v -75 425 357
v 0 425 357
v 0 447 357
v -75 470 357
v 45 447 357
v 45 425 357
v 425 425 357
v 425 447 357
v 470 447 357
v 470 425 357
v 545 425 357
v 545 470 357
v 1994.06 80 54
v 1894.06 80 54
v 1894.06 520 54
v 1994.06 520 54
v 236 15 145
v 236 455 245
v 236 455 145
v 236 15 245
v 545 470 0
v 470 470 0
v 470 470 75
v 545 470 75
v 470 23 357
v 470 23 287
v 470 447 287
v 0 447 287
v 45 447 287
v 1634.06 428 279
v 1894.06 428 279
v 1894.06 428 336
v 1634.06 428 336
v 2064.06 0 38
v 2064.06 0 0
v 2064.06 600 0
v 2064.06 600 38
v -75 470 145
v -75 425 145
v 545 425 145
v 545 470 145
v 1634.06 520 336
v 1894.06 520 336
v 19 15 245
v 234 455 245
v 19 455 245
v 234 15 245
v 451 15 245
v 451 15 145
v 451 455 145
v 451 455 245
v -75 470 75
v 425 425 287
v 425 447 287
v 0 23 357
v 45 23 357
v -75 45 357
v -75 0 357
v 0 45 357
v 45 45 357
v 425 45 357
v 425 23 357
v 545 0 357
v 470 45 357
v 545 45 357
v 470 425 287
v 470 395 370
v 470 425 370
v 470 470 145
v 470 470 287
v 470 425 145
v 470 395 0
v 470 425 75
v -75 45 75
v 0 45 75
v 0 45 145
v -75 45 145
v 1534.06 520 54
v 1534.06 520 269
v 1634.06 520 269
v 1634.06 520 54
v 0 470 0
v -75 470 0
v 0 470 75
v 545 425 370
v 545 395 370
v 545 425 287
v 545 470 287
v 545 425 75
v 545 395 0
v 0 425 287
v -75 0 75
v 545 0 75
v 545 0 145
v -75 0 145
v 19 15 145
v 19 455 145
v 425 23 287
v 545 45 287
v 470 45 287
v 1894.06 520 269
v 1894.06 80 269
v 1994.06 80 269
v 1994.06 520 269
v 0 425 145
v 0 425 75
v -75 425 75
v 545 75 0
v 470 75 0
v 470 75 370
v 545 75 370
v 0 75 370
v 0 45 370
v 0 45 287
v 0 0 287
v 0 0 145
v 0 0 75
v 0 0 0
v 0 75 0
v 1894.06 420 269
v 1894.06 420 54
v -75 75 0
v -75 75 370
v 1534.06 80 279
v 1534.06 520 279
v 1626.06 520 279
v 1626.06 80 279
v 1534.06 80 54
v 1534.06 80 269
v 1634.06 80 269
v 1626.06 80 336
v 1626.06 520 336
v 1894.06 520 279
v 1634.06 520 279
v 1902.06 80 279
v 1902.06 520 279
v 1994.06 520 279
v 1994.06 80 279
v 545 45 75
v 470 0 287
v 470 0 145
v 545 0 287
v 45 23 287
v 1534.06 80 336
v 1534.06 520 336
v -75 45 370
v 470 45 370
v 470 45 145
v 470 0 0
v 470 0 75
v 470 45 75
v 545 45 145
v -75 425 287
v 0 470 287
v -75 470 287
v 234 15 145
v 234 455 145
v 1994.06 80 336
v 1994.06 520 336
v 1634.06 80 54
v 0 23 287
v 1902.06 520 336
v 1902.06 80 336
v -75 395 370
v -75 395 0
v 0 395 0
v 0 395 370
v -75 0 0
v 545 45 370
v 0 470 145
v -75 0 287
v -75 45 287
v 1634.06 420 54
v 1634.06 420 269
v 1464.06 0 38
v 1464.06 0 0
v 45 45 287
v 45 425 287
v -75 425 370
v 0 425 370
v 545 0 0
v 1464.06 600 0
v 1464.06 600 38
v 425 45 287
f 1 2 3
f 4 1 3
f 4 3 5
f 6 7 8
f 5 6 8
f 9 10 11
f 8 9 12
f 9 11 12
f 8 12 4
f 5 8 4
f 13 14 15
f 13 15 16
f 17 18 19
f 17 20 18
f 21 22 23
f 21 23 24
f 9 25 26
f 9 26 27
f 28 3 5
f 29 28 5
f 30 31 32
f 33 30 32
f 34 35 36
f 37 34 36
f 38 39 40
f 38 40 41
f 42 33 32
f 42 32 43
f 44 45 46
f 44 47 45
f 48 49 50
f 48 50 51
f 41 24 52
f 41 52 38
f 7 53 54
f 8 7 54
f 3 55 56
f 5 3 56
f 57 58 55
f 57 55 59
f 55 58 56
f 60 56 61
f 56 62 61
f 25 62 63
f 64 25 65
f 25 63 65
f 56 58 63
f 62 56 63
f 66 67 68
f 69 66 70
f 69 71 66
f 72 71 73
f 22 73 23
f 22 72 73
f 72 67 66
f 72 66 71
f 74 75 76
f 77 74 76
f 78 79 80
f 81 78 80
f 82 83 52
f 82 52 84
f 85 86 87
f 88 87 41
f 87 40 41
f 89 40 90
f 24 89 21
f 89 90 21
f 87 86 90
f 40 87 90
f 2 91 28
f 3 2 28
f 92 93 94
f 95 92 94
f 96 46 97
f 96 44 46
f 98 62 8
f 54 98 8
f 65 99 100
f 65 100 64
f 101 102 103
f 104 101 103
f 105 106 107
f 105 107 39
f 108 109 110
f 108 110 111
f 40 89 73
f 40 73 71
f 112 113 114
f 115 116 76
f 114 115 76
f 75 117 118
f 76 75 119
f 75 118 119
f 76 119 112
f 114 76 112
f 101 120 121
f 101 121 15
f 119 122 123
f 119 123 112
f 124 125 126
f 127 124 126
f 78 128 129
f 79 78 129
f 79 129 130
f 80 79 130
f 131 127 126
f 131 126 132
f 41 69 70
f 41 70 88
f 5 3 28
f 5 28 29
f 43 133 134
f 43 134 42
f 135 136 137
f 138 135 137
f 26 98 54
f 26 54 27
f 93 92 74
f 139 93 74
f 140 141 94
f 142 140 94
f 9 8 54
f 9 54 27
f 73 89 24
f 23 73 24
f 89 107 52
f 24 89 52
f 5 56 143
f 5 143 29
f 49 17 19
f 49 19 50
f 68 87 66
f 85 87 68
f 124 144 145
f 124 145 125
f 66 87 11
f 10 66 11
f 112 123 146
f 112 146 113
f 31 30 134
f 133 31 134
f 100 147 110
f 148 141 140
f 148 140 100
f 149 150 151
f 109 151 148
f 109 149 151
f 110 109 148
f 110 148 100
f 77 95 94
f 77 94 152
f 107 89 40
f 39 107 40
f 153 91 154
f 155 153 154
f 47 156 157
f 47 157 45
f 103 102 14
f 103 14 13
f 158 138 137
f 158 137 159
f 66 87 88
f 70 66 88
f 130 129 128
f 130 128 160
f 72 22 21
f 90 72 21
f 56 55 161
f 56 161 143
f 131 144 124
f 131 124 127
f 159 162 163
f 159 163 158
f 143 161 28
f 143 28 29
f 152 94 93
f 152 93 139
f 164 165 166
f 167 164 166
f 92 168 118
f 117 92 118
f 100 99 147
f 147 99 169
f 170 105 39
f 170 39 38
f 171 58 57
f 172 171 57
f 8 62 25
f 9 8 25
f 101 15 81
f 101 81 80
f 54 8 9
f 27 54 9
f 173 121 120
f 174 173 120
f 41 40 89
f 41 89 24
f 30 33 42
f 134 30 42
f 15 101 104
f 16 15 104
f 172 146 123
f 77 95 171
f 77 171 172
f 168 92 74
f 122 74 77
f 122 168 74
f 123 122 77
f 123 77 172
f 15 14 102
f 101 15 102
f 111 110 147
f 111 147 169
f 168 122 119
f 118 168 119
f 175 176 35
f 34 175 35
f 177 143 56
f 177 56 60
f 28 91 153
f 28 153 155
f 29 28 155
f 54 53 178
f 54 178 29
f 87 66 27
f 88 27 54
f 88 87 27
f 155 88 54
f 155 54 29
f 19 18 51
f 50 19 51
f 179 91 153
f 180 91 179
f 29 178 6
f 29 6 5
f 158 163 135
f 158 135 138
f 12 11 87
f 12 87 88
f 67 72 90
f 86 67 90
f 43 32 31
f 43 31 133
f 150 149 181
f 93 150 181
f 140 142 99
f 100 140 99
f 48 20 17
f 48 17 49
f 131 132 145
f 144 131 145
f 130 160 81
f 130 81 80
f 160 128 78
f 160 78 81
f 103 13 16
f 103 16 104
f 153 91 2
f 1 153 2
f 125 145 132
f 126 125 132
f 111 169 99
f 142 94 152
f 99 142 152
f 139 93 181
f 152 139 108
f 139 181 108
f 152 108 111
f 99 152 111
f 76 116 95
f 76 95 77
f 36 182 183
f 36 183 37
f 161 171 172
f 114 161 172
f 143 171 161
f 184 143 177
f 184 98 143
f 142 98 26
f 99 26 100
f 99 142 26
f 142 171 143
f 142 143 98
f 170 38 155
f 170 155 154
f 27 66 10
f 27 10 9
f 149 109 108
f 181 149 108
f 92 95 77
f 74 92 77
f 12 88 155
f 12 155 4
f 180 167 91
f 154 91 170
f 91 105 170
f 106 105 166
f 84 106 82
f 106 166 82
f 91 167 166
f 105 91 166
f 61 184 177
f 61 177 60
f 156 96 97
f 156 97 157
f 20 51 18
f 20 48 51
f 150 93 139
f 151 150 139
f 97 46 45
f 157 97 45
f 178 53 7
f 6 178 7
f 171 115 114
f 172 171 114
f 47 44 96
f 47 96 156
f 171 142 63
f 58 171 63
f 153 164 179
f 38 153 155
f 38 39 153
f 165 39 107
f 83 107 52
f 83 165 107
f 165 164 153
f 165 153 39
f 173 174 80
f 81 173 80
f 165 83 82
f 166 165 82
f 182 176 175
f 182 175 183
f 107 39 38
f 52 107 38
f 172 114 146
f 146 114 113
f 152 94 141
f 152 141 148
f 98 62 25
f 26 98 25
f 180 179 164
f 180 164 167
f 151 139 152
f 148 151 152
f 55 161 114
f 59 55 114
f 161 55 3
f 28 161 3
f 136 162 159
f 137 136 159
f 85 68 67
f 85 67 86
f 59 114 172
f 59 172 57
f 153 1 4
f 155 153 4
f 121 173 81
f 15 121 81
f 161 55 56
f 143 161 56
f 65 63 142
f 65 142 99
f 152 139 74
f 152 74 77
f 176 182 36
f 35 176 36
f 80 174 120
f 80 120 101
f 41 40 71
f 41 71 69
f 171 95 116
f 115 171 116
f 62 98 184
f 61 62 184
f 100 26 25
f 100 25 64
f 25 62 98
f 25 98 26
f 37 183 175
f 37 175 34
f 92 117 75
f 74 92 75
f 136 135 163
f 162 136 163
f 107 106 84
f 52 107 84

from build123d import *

# Parameters (mm, degrees)
F0_W      = 75
F0_H      = 75
F1_DEPTH  = 370
F2_W      = 45
F2_H      = 204.2819981575
F2_W_2    = 53.7973015904
F2_H_2    = 70
F3_DEPTH  = 620.001
F4_W      = 45
F4_H      = 70
F5_DEPTH  = 620
F6_W      = 45
F6_H      = 22
F7_DEPTH  = 70
F8_W      = 45
F8_H      = 424
F9_DEPTH  = 70
F12_DEPTH = 220
F13_W     = 600
F13_H     = 600
F14_DEPTH = 38
F16_START = -80
F15_W     = 100
F15_H     = 215
F16_DEPTH = 440
F15_W_2   = 92
F15_H_2   = 57
F17_W     = 100
F17_H     = 215
F18_DEPTH = 260
F17_W_2   = 92
F17_H_2   = 57


with BuildPart() as f1:
    # F0 (on Top) → F1 (new body)
    with BuildSketch(Plane.XY):
        with Locations((-37.5, 37.5)):
            Rectangle(F0_W, F0_H)
    extrude(amount=F1_DEPTH)


with BuildPart() as f1b:
    # F0 (on Top) → F1, piece 2 (new body)
    with BuildSketch(Plane.XY):
        with Locations((-37.5, 432.5)):
            Rectangle(F0_W, F0_H)
    extrude(amount=F1_DEPTH)


with BuildPart() as f1c:
    # F0 (on Top) → F1, piece 3 (new body)
    with BuildSketch(Plane.XY):
        with Locations((507.5, 432.5)):
            Rectangle(F0_W, F0_H)
    extrude(amount=F1_DEPTH)


with BuildPart() as f1d:
    # F0 (on Top) → F1, piece 4 (new body)
    with BuildSketch(Plane.XY):
        with Locations((507.5, 37.5)):
            Rectangle(F0_W, F0_H)
    extrude(amount=F1_DEPTH)


with BuildPart() as f3_tool:
    # F2 (on face) → F3 (new body, through all)
    with BuildSketch(Plane.YZ.offset(545)):
        with Locations((22.5, 389.1409990788)):
            Rectangle(F2_W, F2_H)
        with Locations((447.5, 389.1409990788)):
            Rectangle(F2_W, F2_H)
        with Locations((18.1013492048, 110)):
            Rectangle(F2_W_2, F2_H_2)
        with Locations((451.8986507952, 110)):
            Rectangle(F2_W_2, F2_H_2)
    extrude(amount=-F3_DEPTH)


with BuildPart() as f1_1:
    add(f1.part)

    # F3: cut by f3_tool
    add(f3_tool.part, mode=Mode.SUBTRACT)


with BuildPart() as f1b_1:
    add(f1b.part)

    # F3: cut by f3_tool
    add(f3_tool.part, mode=Mode.SUBTRACT)


with BuildPart() as f1c_1:
    add(f1c.part)

    # F3: cut by f3_tool
    add(f3_tool.part, mode=Mode.SUBTRACT)


with BuildPart() as f1d_1:
    add(f1d.part)

    # F3: cut by f3_tool
    add(f3_tool.part, mode=Mode.SUBTRACT)


with BuildPart() as f5:
    # F4 (on face) → F5 (new body, through all)
    with BuildSketch(Plane.YZ.offset(545)):
        with Locations((22.5, 322)):
            Rectangle(F4_W, F4_H)
    extrude(amount=-F5_DEPTH)


with BuildPart() as f5b:
    # F4 (on face) → F5, piece 2 (new body, through all)
    with BuildSketch(Plane.YZ.offset(545)):
        with Locations((22.5, 110)):
            Rectangle(F4_W, F4_H)
    extrude(amount=-F5_DEPTH)


with BuildPart() as f5c:
    # F4 (on face) → F5, piece 3 (new body, through all)
    with BuildSketch(Plane.YZ.offset(545)):
        with Locations((447.5, 110)):
            Rectangle(F4_W, F4_H)
    extrude(amount=-F5_DEPTH)


with BuildPart() as f5d:
    # F4 (on face) → F5, piece 4 (new body, through all)
    with BuildSketch(Plane.YZ.offset(545)):
        with Locations((447.5, 322)):
            Rectangle(F4_W, F4_H)
    extrude(amount=-F5_DEPTH)


with BuildPart() as f7_tool:
    # F6 (on face) → F7 (new body)
    with BuildSketch(Plane.XY.offset(357)):
        with Locations((447.5, 34)):
            Rectangle(F6_W, F6_H)
        with Locations((22.5, 34)):
            Rectangle(F6_W, F6_H)
        with Locations((447.5, 436)):
            Rectangle(F6_W, F6_H)
        with Locations((22.5, 436)):
            Rectangle(F6_W, F6_H)
    extrude(amount=-F7_DEPTH)


with BuildPart() as f5_1:
    add(f5.part)

    # F7: cut by f7_tool
    add(f7_tool.part, mode=Mode.SUBTRACT)


with BuildPart() as f5d_1:
    add(f5d.part)

    # F7: cut by f7_tool
    add(f7_tool.part, mode=Mode.SUBTRACT)


with BuildPart() as f9:
    # F8 (on face) → F9 (new body, through all)
    with BuildSketch(Plane.XY.offset(357)):
        with Locations((22.5, 235)):
            Rectangle(F8_W, F8_H)
    extrude(amount=-F9_DEPTH)


with BuildPart() as f9b:
    # F8 (on face) → F9, piece 2 (new body, through all)
    with BuildSketch(Plane.XY.offset(357)):
        with Locations((447.5, 235)):
            Rectangle(F8_W, F8_H)
    extrude(amount=-F9_DEPTH)


with BuildPart() as f12:
    # F11 (on offset) → F12 (new body, symmetric)
    with BuildSketch(Plane.XZ.offset(-235)):
        Polygon((19, 245), (19, 145), (215, 145), (234, 145), (234, 245), align=None)
    extrude(amount=F12_DEPTH, both=True)


with BuildPart() as f12b:
    # F11 (on offset) → F12, piece 2 (new body, symmetric)
    with BuildSketch(Plane.XZ.offset(-235)):
        Polygon((236, 245), (236, 145), (255, 145), (451, 145), (451, 245), align=None)
    extrude(amount=F12_DEPTH, both=True)


with BuildPart() as f14:
    # F13 (on Top) → F14 (new body)
    with BuildSketch(Plane.XY):
        with Locations((1764.0600681305, 300)):
            Rectangle(F13_W, F13_H)
    extrude(amount=F14_DEPTH)


with BuildPart() as f16:
    # F15 (on Front) → F16 (new body)
    with BuildSketch(Plane.XZ.offset(F16_START)):
        with Locations((1584.0600681305, 161.5)):
            Rectangle(F15_W, F15_H)
    extrude(amount=-F16_DEPTH)


with BuildPart() as f16b:
    # F15 (on Front) → F16, piece 2 (new body)
    with BuildSketch(Plane.XZ.offset(F16_START)):
        with Locations((1944.0600681305, 161.5)):
            Rectangle(F15_W, F15_H)
    extrude(amount=-F16_DEPTH)


with BuildPart() as f16c:
    # F15 (on Front) → F16, piece 3 (new body)
    with BuildSketch(Plane.XZ.offset(F16_START)):
        Polygon((1534.0600681305, 336), (1534.0600681305, 279), (1564.0600681305, 279), (1626.0600681305, 279), (1626.0600681305, 336), align=None)
    extrude(amount=-F16_DEPTH)


with BuildPart() as f16d:
    # F15 (on Front) → F16, piece 4 (new body)
    with BuildSketch(Plane.XZ.offset(F16_START)):
        with Locations((1948.0600681305, 307.5)):
            Rectangle(F15_W_2, F15_H_2)
    extrude(amount=-F16_DEPTH)


with BuildPart() as f18:
    # F17 (on face) → F18 (new body, through all)
    with BuildSketch(Plane.YZ.offset(1634.0600681305)):
        with Locations((470, 161.5)):
            Rectangle(F17_W, F17_H)
    extrude(amount=F18_DEPTH)


with BuildPart() as f18b:
    # F17 (on face) → F18, piece 2 (new body, through all)
    with BuildSketch(Plane.YZ.offset(1634.0600681305)):
        with Locations((474, 307.5)):
            Rectangle(F17_W_2, F17_H_2)
    extrude(amount=F18_DEPTH)


solid = Compound([f1_1.part, f1b_1.part, f1c_1.part, f1d_1.part, f5b.part, f5c.part, f5_1.part, f5d_1.part, f9.part, f9b.part, f12.part, f12b.part, f14.part, f16.part, f16b.part, f16c.part, f16d.part, f18.part, f18b.part])
